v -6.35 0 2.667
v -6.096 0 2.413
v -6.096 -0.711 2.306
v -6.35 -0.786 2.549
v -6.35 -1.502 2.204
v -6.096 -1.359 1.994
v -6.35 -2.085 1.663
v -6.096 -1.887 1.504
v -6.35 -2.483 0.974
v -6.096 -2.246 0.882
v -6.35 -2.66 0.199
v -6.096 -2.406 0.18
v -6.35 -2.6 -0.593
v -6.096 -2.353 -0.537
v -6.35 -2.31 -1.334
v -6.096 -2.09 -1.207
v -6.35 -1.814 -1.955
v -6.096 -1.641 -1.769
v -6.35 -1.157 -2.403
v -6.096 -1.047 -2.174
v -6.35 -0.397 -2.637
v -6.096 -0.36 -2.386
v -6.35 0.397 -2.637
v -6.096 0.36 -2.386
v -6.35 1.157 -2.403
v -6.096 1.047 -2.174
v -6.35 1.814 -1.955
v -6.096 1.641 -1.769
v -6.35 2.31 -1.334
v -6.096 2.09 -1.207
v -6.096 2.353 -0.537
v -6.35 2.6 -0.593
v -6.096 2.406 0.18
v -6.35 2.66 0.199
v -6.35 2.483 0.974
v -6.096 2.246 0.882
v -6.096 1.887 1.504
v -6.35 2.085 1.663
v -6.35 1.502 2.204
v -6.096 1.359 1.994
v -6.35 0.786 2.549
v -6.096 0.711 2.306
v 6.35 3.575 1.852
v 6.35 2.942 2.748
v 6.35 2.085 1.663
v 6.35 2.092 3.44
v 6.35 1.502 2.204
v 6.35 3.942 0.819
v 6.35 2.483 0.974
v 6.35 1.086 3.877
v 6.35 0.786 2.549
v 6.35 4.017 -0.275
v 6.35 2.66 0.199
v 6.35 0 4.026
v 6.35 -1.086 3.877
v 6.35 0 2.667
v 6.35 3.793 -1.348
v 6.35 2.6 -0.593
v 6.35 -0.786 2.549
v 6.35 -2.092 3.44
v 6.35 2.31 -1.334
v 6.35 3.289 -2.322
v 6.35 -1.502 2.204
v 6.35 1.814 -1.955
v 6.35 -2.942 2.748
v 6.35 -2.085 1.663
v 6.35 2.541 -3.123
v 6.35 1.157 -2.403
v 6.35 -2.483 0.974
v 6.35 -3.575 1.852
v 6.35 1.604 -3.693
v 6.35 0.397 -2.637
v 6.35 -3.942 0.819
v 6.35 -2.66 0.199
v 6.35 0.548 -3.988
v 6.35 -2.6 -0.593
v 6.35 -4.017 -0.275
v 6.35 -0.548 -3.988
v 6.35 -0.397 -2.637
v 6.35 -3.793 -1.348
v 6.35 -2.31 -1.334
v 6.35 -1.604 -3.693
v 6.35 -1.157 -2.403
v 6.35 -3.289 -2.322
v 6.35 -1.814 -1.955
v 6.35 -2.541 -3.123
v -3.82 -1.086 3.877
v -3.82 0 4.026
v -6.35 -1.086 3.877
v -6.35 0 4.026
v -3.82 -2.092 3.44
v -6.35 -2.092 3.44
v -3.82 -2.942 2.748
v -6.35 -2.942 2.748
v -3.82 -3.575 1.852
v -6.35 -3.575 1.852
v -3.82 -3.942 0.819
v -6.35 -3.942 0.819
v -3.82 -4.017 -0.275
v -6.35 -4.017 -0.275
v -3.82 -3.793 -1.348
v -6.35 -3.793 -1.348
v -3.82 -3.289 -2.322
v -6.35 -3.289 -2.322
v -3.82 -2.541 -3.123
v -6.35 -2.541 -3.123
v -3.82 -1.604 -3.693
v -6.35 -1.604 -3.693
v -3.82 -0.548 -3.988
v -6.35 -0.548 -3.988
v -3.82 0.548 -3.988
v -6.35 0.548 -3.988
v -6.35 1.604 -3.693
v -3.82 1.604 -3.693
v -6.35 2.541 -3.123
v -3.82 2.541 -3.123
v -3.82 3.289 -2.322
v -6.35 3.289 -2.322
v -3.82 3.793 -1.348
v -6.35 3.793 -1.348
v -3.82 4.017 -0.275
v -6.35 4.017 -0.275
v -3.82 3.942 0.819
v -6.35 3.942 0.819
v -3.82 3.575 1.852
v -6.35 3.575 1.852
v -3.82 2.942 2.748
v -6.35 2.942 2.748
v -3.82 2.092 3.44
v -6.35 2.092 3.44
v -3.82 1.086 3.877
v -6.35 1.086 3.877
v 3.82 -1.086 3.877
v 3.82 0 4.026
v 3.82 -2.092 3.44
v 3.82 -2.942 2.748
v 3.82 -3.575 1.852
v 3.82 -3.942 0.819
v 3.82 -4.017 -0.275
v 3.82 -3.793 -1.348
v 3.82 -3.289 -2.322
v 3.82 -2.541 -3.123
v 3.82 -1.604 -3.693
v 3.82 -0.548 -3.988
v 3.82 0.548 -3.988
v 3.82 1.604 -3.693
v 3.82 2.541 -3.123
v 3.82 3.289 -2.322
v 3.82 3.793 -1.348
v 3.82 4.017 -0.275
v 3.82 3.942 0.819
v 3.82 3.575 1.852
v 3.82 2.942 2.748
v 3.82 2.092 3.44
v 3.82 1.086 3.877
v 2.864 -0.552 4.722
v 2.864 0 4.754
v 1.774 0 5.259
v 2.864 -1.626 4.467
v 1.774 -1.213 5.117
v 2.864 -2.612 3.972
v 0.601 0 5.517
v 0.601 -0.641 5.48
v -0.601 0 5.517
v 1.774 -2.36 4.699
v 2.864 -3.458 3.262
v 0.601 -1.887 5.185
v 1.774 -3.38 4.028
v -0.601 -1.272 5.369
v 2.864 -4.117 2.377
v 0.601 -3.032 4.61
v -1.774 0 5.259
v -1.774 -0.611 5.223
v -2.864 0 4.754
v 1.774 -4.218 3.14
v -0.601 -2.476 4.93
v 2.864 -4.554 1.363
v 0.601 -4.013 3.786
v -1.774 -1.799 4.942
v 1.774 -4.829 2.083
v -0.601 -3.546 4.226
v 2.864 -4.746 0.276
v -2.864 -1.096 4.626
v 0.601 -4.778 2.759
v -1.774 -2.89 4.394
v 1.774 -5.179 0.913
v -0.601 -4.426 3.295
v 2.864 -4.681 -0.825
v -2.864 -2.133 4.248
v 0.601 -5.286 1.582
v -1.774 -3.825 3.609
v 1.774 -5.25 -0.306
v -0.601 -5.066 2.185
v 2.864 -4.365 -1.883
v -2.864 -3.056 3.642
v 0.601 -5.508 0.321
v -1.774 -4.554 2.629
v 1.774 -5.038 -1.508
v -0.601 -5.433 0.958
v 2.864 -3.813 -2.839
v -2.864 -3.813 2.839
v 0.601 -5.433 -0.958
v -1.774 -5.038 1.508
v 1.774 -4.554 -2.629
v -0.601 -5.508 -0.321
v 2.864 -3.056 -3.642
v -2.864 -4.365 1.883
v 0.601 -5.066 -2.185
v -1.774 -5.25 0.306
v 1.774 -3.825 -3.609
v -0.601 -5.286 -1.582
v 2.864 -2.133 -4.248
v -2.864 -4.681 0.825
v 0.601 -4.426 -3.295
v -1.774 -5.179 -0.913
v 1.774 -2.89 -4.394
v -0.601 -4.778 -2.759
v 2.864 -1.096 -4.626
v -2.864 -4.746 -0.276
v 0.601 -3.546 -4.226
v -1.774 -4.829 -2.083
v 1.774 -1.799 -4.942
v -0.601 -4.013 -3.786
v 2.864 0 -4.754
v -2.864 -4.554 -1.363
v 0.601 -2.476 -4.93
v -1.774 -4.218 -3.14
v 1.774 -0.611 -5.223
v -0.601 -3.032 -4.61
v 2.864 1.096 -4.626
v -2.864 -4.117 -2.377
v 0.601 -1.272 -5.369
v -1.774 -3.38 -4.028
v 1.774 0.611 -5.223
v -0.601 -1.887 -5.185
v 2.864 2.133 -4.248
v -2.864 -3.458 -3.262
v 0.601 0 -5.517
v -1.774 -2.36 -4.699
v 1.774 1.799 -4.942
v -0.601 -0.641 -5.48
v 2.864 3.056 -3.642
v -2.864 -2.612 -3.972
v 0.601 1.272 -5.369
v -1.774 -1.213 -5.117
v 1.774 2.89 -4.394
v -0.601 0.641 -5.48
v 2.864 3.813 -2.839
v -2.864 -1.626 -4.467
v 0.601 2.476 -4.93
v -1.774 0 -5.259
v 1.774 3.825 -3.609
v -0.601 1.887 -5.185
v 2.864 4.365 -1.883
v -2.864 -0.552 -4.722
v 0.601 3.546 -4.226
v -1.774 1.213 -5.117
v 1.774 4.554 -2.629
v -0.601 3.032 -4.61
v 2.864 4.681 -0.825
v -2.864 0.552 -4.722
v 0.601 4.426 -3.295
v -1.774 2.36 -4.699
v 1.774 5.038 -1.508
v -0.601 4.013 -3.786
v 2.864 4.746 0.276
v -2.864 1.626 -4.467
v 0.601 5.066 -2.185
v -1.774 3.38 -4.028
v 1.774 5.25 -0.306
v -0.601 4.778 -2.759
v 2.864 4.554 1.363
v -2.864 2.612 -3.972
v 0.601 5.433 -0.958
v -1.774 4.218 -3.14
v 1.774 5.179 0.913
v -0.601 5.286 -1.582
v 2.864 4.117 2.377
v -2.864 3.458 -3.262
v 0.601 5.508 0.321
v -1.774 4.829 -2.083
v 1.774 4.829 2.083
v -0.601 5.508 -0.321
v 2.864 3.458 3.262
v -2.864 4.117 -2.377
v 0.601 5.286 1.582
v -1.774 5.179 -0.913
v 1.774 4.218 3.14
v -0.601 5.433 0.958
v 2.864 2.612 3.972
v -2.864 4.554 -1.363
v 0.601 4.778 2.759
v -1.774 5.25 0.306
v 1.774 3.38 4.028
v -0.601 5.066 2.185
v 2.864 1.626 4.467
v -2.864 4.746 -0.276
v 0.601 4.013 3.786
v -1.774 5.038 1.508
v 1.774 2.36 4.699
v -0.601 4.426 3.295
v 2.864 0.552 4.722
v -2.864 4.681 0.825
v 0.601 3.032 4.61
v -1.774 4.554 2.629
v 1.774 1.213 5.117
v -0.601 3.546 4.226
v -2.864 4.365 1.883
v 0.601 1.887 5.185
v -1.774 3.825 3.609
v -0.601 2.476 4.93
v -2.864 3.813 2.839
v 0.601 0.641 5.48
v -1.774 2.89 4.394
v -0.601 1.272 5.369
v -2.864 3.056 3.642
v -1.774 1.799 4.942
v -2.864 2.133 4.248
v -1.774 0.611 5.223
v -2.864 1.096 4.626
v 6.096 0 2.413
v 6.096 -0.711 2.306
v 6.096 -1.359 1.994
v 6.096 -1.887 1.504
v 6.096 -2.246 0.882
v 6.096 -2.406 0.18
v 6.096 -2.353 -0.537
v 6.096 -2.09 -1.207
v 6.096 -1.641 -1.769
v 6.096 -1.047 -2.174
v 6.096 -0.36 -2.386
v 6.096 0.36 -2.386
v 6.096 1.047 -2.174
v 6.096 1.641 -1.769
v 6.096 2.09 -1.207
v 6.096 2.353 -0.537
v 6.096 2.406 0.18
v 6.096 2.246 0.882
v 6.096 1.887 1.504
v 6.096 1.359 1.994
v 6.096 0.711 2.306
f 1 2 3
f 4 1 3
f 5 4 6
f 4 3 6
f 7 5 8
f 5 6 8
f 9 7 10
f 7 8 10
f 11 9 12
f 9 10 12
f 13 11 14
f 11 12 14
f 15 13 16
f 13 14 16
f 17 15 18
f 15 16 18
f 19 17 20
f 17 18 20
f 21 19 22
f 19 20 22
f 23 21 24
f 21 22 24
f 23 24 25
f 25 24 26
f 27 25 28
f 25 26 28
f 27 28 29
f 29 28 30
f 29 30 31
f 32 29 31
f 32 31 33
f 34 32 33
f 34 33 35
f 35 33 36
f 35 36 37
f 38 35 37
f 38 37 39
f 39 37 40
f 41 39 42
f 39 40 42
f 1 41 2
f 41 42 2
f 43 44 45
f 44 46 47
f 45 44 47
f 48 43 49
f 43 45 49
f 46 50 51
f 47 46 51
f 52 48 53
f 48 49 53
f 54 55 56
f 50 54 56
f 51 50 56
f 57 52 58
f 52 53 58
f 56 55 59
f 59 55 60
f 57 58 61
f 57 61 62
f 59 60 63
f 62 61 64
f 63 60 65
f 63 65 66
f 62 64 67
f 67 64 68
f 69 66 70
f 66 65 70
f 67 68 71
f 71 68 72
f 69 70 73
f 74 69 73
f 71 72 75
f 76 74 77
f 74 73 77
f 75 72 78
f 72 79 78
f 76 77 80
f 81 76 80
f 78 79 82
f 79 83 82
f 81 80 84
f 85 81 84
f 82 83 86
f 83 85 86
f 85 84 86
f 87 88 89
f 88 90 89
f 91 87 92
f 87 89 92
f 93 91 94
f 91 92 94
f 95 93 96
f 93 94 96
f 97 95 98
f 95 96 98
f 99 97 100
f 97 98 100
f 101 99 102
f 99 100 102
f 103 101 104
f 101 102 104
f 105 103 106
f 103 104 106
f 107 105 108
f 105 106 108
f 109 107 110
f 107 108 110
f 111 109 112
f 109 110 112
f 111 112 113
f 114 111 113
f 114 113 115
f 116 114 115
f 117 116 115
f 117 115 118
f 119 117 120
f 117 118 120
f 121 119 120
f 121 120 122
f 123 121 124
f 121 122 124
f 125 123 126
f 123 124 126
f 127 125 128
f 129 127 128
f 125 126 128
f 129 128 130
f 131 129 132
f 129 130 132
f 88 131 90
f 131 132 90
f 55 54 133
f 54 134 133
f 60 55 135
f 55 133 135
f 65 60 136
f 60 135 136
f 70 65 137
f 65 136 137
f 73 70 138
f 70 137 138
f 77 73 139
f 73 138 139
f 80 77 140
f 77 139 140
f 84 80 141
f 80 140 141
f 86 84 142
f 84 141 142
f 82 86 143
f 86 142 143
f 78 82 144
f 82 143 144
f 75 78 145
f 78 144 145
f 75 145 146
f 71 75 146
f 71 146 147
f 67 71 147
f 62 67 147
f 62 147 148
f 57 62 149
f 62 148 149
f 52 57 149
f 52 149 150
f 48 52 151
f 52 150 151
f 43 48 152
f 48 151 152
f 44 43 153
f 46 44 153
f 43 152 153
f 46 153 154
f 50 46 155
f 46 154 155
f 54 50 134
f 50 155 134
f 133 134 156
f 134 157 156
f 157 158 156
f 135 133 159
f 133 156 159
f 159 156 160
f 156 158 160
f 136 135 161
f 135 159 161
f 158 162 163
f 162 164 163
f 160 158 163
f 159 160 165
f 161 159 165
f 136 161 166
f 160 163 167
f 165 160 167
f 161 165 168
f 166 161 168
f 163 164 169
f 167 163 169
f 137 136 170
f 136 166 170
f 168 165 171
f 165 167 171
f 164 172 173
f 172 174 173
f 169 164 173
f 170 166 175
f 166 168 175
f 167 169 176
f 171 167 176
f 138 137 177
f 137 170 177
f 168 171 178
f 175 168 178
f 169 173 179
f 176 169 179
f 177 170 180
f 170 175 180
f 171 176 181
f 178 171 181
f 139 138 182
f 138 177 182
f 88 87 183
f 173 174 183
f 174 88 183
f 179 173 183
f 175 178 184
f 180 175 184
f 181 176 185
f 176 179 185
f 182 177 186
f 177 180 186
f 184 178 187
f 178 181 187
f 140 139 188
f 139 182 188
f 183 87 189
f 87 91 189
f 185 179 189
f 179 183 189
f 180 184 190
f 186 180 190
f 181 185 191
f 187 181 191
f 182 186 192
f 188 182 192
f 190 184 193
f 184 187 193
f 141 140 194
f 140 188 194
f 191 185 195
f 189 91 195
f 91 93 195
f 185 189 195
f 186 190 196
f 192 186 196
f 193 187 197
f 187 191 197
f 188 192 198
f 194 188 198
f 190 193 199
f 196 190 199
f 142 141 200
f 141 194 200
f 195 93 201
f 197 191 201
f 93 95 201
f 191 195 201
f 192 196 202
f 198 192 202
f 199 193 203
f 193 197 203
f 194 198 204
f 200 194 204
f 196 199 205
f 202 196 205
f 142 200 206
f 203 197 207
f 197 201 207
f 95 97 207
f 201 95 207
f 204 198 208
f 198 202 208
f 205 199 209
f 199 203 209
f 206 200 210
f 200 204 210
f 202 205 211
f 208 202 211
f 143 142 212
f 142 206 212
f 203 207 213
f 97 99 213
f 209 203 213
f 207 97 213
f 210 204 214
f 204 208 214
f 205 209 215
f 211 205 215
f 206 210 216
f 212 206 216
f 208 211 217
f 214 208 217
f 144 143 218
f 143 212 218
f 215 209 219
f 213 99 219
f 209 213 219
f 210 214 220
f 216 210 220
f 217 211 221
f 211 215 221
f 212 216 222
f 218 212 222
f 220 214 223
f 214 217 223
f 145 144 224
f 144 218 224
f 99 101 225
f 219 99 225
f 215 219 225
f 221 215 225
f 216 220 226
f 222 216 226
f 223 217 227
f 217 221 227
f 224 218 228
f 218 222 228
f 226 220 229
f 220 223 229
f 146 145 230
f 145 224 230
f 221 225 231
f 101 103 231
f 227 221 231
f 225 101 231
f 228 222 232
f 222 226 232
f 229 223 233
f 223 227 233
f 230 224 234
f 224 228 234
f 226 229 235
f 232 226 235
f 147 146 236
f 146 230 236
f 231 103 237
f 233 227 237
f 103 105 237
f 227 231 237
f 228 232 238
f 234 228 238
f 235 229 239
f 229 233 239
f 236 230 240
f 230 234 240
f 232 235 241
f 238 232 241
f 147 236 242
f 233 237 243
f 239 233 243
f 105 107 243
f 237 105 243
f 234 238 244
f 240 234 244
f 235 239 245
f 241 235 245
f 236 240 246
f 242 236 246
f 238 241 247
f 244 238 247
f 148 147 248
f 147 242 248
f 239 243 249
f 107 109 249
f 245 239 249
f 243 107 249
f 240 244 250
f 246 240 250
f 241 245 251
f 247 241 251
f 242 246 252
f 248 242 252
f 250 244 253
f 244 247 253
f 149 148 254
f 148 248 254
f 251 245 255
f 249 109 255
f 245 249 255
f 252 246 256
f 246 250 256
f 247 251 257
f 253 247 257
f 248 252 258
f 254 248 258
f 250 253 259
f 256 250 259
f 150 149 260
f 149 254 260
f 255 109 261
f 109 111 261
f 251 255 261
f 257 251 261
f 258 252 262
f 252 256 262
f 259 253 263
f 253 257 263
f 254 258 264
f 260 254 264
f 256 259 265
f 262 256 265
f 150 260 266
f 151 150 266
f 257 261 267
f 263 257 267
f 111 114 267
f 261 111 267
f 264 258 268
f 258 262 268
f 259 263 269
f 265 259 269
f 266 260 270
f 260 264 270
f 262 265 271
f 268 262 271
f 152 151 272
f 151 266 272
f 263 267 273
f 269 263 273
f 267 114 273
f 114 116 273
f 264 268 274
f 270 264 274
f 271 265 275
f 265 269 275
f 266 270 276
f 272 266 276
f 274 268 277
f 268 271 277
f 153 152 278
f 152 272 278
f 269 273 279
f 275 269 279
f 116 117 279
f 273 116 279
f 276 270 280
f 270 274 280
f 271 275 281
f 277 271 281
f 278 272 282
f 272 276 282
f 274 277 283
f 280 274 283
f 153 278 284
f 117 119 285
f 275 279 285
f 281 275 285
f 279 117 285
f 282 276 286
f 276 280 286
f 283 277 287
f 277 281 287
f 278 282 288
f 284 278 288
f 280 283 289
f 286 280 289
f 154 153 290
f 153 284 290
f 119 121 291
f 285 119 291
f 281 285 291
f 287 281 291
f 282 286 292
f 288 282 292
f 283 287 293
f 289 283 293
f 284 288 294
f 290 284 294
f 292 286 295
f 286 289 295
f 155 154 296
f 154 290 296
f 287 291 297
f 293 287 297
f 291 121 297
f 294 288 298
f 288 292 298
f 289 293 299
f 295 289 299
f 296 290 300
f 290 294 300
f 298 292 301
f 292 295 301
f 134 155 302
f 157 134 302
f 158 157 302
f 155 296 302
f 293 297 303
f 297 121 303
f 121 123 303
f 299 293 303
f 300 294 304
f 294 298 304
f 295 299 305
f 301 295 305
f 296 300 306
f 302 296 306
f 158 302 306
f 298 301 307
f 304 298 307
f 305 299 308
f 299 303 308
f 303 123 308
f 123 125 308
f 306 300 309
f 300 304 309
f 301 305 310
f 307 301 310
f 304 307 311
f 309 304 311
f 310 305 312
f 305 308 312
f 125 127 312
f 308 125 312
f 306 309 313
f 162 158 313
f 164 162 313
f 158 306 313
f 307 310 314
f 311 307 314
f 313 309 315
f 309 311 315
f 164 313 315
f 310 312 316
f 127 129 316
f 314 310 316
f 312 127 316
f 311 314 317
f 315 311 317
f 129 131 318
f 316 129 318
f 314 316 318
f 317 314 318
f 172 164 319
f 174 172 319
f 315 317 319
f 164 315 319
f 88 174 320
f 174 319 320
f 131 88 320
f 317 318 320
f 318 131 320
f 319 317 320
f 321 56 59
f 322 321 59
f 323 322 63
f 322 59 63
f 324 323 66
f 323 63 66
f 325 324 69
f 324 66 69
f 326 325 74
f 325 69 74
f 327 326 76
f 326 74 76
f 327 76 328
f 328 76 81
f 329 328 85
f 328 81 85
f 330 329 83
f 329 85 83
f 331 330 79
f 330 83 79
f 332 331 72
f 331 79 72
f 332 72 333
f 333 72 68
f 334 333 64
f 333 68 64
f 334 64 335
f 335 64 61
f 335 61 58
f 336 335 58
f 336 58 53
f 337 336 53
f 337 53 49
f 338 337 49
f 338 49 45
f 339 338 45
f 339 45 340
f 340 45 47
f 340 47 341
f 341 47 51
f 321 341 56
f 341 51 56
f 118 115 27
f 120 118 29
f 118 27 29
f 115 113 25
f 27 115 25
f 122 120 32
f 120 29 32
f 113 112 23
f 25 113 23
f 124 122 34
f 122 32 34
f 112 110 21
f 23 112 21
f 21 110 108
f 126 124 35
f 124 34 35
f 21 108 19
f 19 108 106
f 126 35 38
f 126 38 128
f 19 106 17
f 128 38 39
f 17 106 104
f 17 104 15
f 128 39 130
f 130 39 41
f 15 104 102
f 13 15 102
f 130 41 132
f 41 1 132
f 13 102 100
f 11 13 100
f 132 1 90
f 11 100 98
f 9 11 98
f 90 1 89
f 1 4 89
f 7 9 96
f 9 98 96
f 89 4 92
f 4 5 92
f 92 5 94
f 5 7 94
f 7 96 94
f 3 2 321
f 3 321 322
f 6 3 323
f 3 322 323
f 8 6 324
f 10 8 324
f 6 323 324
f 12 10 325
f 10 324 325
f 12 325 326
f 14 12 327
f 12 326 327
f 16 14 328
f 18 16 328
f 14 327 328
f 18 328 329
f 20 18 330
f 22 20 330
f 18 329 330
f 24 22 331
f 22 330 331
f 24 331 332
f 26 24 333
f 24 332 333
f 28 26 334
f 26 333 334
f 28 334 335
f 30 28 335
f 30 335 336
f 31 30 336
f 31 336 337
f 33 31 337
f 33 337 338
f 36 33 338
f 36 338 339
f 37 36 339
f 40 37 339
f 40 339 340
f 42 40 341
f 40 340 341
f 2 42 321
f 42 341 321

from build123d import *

# Parameters (mm, degrees)
CHAMFER1_SIZE = 0.254


with BuildPart() as part:
    # Sketch1 → Revolve1 (revolve)
    with BuildSketch(Plane.XY, mode=Mode.PRIVATE) as revolve1_sk:
        with BuildLine():
            Line((-6.35, 4.0259), (-6.35, 2.413))
            Line((-6.35, 2.413), (6.35, 2.413))
            Line((6.35, 2.413), (6.35, 4.0259))
            Line((6.35, 4.0259), (3.820146489, 4.0259))
            ThreePointArc((3.820146489, 4.0259), (0, 5.5499), (-3.820146489, 4.0259))
            Line((-3.820146489, 4.0259), (-6.35, 4.0259))
        make_face()
    revolve(revolve1_sk.sketch.rotate(Axis((-18.157637283, 0, 0), (1, 0, 0)), 90), axis=Axis((-18.157637283, 0, 0), (1, 0, 0)))

    # Chamfer1
    chamfer1_edges = [part.edges().sort_by_distance(p)[0] for p in [
        (-6.35, 0, -2.413),
        (6.35, 0, -2.413),
    ]]
    chamfer(chamfer1_edges, length=CHAMFER1_SIZE)


solid = part.part
